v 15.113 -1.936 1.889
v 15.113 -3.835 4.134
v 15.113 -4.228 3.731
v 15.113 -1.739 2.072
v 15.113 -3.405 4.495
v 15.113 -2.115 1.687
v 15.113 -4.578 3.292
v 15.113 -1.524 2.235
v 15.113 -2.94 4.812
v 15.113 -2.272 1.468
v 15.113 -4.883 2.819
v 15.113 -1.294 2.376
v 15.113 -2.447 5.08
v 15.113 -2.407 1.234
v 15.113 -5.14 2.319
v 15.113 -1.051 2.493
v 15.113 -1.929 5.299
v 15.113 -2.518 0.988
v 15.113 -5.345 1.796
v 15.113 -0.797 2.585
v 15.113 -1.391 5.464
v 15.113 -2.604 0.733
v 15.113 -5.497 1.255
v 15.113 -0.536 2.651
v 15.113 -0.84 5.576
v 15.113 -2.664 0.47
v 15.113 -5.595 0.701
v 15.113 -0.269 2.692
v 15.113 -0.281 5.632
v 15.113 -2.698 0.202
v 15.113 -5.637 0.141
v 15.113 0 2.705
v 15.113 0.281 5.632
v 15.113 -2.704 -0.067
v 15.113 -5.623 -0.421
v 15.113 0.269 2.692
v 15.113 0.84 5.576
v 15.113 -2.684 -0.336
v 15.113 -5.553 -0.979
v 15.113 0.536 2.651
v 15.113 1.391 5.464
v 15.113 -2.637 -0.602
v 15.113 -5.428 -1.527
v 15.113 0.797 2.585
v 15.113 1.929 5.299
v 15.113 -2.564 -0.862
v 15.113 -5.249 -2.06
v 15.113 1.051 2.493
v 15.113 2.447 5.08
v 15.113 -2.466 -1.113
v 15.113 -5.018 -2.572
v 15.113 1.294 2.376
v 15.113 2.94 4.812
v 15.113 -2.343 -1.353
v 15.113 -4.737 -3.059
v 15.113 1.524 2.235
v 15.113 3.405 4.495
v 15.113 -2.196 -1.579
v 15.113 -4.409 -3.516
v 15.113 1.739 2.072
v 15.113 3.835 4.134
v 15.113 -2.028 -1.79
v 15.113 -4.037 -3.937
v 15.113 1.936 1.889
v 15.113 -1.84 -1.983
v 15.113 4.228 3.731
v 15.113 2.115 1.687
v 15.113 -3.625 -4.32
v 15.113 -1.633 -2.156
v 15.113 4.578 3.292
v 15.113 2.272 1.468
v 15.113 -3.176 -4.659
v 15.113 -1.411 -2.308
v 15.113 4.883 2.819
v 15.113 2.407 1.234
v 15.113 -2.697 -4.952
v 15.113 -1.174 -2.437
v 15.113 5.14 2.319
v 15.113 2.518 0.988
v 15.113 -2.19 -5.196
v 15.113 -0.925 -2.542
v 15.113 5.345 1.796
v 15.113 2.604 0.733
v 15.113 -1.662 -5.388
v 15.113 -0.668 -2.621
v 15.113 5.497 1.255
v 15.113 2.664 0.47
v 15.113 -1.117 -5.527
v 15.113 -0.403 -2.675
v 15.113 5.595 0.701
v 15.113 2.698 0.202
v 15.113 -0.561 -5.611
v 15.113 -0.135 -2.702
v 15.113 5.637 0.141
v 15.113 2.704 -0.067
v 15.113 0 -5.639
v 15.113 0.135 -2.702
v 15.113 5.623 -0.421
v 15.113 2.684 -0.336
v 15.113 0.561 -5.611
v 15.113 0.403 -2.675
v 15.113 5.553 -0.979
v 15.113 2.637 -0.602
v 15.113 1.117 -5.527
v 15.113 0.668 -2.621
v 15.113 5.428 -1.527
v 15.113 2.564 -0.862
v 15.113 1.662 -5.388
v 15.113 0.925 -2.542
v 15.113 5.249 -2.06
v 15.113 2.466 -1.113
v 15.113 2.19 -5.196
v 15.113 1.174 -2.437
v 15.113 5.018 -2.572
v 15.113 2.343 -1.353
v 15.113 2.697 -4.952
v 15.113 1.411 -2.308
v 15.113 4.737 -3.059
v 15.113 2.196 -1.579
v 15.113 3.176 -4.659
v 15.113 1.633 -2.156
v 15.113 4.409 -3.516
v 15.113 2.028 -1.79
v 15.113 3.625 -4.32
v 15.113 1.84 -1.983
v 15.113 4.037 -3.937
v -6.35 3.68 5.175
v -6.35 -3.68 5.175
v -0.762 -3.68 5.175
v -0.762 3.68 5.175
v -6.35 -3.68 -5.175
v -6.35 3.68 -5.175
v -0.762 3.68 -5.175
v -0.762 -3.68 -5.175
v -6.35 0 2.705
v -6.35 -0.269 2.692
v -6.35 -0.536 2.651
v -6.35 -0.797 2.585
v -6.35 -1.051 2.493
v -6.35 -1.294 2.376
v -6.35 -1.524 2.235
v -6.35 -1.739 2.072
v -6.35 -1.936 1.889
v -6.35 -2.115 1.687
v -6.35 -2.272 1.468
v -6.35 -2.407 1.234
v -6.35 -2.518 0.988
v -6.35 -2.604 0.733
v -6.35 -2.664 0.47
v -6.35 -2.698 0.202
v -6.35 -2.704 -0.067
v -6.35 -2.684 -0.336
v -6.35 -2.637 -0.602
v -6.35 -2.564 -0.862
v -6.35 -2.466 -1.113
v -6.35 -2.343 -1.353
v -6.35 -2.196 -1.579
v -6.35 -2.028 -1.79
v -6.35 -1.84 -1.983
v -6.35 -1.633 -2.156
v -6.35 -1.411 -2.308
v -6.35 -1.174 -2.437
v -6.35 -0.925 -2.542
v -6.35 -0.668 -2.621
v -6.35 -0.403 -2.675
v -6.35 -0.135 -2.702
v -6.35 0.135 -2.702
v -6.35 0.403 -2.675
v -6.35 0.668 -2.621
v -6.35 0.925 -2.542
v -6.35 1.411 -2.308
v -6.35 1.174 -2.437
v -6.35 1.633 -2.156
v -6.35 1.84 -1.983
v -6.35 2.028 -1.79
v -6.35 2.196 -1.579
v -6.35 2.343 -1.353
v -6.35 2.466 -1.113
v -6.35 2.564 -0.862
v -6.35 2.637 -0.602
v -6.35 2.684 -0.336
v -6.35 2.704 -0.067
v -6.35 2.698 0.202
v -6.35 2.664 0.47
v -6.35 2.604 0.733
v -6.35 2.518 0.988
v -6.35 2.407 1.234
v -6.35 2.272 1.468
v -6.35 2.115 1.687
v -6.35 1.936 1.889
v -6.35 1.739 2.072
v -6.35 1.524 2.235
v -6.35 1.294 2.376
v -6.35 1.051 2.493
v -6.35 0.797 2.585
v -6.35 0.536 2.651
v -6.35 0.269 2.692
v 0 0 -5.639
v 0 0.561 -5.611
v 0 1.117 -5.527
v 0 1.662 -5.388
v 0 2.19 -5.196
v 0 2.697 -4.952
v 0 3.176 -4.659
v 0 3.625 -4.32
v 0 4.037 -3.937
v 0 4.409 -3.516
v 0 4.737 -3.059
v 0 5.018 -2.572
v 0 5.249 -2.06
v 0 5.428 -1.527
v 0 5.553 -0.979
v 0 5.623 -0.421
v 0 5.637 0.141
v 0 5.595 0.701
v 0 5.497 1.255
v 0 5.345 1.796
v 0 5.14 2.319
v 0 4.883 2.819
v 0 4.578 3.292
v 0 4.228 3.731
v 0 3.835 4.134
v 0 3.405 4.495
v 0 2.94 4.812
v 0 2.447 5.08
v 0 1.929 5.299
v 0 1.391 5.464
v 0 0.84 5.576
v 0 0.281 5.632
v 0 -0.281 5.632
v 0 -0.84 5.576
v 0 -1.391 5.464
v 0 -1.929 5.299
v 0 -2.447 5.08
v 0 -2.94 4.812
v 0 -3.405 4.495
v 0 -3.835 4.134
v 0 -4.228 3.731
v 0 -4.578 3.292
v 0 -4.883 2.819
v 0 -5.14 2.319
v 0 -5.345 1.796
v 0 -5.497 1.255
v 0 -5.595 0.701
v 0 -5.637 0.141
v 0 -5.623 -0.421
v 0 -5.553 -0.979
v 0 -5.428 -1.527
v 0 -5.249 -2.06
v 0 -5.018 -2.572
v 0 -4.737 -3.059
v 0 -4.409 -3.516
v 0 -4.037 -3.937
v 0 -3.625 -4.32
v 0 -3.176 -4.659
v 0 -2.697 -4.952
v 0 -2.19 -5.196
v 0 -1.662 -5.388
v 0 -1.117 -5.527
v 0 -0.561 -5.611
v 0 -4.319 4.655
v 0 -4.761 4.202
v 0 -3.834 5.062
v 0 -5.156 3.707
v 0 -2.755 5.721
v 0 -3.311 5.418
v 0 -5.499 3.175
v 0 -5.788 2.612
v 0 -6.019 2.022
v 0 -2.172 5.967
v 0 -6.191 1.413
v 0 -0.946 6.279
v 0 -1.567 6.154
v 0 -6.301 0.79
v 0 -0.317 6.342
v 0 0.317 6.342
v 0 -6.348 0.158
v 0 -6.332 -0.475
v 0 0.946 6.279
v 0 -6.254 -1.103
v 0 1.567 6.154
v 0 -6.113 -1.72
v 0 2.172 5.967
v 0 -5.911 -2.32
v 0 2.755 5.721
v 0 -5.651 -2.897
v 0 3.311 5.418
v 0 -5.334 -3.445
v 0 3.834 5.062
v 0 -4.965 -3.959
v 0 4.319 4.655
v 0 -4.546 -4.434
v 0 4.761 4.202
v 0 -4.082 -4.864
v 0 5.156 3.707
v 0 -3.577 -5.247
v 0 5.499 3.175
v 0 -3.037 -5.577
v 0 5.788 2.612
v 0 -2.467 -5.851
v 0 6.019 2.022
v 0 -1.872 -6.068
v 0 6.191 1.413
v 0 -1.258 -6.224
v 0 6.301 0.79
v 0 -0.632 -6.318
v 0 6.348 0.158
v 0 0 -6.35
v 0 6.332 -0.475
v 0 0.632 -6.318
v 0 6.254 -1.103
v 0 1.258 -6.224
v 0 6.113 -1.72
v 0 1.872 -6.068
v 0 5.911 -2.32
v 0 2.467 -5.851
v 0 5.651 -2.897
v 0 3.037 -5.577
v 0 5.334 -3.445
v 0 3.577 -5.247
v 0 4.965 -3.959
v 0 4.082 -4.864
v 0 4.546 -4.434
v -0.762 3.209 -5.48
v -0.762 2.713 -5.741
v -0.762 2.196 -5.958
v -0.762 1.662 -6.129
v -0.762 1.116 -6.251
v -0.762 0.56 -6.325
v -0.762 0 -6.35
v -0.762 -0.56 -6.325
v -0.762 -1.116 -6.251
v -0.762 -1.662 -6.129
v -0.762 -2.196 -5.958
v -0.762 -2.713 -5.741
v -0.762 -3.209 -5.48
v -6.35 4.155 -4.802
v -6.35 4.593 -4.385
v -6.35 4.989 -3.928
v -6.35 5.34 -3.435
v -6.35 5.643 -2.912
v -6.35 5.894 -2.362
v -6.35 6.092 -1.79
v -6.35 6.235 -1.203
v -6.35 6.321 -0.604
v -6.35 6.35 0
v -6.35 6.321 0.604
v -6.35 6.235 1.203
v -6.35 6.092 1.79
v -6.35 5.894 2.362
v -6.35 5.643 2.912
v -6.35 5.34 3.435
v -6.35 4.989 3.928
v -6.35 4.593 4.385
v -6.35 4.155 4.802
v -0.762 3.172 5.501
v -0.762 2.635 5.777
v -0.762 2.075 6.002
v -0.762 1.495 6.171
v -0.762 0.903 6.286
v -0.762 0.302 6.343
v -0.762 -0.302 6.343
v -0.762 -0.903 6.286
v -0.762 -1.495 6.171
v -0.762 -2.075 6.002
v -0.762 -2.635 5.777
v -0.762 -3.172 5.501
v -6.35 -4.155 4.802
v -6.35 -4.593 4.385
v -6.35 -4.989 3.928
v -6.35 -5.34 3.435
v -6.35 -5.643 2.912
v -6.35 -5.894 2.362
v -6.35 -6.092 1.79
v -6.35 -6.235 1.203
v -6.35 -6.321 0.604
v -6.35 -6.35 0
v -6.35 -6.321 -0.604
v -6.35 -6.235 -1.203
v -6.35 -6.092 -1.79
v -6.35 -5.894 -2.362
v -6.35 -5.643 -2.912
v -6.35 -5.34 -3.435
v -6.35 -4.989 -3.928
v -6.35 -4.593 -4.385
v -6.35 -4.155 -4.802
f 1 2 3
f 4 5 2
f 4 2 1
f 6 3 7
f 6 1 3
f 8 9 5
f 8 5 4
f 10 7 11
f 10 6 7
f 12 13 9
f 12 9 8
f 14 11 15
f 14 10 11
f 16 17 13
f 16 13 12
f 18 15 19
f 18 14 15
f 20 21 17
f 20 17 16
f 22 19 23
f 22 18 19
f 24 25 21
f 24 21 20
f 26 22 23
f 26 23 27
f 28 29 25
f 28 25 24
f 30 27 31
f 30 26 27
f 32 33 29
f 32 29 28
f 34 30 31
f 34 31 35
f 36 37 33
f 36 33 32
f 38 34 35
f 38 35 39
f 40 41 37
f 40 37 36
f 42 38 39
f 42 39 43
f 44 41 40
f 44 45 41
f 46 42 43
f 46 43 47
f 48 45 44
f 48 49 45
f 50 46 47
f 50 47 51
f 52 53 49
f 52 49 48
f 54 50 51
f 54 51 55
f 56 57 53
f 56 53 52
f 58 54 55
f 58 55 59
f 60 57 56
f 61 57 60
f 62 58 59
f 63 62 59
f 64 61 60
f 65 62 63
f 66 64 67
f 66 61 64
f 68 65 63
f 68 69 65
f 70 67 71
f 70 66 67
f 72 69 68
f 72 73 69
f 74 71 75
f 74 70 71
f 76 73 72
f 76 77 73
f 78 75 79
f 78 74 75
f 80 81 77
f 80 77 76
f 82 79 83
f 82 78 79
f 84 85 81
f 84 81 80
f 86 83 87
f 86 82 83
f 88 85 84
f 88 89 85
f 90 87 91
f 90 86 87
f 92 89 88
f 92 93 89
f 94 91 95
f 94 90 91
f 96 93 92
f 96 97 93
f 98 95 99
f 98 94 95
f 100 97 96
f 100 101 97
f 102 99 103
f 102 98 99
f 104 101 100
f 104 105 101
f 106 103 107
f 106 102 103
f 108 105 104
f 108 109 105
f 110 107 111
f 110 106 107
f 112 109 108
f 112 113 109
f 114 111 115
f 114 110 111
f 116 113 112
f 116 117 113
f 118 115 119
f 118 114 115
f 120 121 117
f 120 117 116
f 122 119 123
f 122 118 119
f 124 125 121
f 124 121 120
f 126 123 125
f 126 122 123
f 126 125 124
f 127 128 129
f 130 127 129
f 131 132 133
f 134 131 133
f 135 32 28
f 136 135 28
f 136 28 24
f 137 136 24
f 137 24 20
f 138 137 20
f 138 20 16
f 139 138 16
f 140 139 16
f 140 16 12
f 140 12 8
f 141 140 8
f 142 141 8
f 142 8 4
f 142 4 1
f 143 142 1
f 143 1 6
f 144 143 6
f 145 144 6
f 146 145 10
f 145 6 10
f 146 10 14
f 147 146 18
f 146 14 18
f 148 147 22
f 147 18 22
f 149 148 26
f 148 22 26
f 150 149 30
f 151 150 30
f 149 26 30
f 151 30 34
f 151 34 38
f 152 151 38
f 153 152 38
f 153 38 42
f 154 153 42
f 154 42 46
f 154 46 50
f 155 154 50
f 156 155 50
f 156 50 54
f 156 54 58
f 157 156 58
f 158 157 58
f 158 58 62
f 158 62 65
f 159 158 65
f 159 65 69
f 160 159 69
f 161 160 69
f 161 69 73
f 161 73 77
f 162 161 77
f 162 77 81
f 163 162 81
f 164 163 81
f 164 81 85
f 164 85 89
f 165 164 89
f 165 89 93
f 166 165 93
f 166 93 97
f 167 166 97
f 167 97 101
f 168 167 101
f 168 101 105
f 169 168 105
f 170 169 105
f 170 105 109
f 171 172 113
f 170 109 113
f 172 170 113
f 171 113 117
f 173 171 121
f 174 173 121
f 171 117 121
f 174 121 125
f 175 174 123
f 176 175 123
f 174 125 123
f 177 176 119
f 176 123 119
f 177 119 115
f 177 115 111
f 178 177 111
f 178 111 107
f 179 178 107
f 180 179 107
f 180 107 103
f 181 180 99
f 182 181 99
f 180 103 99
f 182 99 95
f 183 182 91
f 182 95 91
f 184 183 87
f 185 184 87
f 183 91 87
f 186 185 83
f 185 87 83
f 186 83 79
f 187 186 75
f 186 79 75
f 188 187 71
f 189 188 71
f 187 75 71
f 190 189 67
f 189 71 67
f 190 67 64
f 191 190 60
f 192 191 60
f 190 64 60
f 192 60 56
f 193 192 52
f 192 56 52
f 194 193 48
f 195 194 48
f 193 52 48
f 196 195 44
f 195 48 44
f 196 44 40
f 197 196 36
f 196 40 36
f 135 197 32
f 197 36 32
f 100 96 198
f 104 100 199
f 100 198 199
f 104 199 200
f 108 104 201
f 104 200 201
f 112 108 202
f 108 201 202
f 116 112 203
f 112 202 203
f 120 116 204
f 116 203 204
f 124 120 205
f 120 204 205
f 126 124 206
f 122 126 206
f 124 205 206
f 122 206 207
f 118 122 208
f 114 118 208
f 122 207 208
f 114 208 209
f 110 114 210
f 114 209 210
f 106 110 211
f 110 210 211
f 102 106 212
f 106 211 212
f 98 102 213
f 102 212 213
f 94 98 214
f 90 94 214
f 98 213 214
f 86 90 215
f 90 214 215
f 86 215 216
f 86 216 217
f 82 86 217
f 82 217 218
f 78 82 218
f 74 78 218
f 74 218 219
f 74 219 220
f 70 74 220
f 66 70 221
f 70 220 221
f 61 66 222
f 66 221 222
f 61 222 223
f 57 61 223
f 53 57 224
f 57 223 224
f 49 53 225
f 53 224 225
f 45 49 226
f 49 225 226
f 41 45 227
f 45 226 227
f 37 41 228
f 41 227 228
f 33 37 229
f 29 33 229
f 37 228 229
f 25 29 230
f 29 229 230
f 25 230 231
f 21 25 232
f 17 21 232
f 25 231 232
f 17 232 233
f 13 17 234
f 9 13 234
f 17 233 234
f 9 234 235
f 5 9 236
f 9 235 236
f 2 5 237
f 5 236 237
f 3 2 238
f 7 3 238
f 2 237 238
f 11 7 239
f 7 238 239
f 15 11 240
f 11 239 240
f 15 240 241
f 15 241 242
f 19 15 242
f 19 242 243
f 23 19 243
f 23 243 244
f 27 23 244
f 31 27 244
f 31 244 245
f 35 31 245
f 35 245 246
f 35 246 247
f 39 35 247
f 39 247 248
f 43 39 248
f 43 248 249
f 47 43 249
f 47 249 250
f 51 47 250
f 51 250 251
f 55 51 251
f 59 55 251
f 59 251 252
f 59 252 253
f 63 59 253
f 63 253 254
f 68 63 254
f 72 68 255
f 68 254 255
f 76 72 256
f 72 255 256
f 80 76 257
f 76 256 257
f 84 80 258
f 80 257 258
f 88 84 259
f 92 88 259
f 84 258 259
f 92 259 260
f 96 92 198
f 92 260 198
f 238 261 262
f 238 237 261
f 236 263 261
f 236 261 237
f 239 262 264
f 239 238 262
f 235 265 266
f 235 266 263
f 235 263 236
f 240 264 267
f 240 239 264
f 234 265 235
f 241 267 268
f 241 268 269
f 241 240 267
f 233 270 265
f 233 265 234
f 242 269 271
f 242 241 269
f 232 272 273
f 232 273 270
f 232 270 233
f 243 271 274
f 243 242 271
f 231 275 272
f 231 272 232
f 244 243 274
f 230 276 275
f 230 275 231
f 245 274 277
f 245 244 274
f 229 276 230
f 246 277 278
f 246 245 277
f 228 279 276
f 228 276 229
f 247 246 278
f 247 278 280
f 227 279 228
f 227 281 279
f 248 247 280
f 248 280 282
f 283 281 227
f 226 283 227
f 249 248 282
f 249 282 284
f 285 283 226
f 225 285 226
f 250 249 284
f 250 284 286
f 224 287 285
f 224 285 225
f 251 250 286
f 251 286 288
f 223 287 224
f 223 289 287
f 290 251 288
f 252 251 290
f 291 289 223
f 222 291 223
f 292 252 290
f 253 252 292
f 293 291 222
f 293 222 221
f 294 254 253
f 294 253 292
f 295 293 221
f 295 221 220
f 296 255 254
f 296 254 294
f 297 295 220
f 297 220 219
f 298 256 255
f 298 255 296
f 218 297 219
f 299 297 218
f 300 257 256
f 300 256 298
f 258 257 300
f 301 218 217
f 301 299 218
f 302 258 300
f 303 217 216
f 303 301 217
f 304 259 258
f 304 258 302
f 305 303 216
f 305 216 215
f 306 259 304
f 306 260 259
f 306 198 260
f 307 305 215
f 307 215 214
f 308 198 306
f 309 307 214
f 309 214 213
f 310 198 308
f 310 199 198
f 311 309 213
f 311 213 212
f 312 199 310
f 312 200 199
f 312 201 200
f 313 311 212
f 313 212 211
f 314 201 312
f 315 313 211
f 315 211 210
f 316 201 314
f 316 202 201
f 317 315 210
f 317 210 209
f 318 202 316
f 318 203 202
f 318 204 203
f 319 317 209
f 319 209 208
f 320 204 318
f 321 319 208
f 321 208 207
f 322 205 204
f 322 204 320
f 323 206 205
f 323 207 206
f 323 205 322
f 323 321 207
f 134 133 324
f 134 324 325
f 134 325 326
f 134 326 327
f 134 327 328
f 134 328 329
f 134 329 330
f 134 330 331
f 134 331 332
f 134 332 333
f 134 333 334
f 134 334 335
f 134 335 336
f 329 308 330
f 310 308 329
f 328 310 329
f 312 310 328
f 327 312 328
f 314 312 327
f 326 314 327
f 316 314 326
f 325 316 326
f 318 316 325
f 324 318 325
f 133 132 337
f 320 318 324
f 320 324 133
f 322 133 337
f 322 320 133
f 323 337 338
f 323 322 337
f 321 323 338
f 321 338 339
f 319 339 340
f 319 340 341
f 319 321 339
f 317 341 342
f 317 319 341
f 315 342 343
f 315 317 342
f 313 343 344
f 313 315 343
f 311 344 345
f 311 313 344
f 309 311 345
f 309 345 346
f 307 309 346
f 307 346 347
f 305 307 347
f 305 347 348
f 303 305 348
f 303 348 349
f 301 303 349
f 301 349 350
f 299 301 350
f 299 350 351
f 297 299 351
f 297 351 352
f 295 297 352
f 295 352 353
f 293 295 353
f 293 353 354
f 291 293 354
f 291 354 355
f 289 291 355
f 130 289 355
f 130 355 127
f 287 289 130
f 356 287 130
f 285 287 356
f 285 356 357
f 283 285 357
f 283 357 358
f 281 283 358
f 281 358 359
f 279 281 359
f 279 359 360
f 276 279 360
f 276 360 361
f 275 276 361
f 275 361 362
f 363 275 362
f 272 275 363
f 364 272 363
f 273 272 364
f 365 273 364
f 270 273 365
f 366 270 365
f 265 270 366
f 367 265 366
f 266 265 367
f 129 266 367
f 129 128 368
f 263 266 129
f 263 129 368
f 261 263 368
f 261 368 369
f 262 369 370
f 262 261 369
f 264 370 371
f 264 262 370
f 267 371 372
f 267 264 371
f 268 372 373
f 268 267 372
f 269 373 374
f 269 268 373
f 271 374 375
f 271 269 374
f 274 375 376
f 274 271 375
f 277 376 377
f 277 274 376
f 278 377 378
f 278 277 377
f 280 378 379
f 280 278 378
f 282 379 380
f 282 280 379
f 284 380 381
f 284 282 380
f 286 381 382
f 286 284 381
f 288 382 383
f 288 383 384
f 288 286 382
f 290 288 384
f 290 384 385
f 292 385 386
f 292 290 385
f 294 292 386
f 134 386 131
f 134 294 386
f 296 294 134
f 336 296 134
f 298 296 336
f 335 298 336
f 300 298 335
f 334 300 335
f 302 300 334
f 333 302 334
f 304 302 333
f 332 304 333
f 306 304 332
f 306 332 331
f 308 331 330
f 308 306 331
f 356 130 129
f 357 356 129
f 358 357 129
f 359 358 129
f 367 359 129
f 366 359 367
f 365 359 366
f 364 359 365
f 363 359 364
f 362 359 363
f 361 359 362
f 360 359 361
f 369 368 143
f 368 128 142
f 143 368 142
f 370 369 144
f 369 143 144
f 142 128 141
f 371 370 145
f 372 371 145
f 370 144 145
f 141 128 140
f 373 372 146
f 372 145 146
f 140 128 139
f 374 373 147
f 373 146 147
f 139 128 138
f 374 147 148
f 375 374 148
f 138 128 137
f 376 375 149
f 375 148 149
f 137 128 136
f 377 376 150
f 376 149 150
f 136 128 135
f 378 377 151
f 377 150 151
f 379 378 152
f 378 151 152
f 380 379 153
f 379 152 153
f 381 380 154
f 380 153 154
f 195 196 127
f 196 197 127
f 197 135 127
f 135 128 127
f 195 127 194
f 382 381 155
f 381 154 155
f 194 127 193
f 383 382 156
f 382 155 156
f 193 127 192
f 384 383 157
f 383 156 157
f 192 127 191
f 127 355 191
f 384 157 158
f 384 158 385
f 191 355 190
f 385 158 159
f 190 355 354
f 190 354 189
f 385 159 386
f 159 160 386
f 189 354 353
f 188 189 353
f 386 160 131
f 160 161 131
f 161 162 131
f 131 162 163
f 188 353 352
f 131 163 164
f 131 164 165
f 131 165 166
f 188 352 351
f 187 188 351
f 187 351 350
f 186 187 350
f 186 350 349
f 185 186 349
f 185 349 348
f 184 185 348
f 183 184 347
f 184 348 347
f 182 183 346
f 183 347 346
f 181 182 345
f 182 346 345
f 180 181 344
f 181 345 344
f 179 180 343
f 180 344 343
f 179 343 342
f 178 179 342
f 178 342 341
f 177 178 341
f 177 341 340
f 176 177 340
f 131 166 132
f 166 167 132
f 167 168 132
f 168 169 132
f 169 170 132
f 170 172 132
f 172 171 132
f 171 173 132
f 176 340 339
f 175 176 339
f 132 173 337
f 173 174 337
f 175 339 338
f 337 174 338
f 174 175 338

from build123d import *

# Parameters (mm, degrees)
SKETCH2_R               = 6.35
BOSS_EXTRUDE1_DEPTH     = 6.35
SKETCH3_R               = 5.6388
BOSS_EXTRUDE2_DEPTH     = 15.113
SKETCH4_W               = 5.588
SKETCH4_H               = 1.17475
CUT_EXTRUDE1_DEPTH      = 6.35
F_1_4_28_TAPPED_HOLE1_D = 5.4102


with BuildPart() as part:
    # Sketch2 → Boss-Extrude1 (new body)
    with BuildSketch(Plane(origin=(0, 0, 0), x_dir=(0, 0, -1), z_dir=(1, 0, 0))):
        Circle(SKETCH2_R)
    extrude(amount=-BOSS_EXTRUDE1_DEPTH)

    # Sketch3 → Boss-Extrude2 (add)
    with BuildSketch(Plane(origin=(0, 0, 0), x_dir=(0, 0, -1), z_dir=(1, 0, 0))):
        Circle(SKETCH3_R)
    extrude(amount=BOSS_EXTRUDE2_DEPTH)

    # Sketch4 → Cut-Extrude1 (cut, symmetric)
    with BuildSketch(Plane(origin=(0, 0, 0), x_dir=(1, 0, 0), z_dir=(0, 1, 0))):
        with Locations((-3.556, 5.762625)):
            Rectangle(SKETCH4_W, SKETCH4_H)
        with Locations((-3.556, -5.762625)):
            Rectangle(SKETCH4_W, SKETCH4_H)
    extrude(amount=CUT_EXTRUDE1_DEPTH, both=True, mode=Mode.SUBTRACT)

    # 1/4-28 Tapped Hole1 (through all)
    with Locations(Plane(origin=(-6.35, 0, 0), x_dir=(0, 0, -1), z_dir=(-1, 0, 0))):
        with Locations((0, 0)):
            Hole(F_1_4_28_TAPPED_HOLE1_D / 2)


solid = part.part
